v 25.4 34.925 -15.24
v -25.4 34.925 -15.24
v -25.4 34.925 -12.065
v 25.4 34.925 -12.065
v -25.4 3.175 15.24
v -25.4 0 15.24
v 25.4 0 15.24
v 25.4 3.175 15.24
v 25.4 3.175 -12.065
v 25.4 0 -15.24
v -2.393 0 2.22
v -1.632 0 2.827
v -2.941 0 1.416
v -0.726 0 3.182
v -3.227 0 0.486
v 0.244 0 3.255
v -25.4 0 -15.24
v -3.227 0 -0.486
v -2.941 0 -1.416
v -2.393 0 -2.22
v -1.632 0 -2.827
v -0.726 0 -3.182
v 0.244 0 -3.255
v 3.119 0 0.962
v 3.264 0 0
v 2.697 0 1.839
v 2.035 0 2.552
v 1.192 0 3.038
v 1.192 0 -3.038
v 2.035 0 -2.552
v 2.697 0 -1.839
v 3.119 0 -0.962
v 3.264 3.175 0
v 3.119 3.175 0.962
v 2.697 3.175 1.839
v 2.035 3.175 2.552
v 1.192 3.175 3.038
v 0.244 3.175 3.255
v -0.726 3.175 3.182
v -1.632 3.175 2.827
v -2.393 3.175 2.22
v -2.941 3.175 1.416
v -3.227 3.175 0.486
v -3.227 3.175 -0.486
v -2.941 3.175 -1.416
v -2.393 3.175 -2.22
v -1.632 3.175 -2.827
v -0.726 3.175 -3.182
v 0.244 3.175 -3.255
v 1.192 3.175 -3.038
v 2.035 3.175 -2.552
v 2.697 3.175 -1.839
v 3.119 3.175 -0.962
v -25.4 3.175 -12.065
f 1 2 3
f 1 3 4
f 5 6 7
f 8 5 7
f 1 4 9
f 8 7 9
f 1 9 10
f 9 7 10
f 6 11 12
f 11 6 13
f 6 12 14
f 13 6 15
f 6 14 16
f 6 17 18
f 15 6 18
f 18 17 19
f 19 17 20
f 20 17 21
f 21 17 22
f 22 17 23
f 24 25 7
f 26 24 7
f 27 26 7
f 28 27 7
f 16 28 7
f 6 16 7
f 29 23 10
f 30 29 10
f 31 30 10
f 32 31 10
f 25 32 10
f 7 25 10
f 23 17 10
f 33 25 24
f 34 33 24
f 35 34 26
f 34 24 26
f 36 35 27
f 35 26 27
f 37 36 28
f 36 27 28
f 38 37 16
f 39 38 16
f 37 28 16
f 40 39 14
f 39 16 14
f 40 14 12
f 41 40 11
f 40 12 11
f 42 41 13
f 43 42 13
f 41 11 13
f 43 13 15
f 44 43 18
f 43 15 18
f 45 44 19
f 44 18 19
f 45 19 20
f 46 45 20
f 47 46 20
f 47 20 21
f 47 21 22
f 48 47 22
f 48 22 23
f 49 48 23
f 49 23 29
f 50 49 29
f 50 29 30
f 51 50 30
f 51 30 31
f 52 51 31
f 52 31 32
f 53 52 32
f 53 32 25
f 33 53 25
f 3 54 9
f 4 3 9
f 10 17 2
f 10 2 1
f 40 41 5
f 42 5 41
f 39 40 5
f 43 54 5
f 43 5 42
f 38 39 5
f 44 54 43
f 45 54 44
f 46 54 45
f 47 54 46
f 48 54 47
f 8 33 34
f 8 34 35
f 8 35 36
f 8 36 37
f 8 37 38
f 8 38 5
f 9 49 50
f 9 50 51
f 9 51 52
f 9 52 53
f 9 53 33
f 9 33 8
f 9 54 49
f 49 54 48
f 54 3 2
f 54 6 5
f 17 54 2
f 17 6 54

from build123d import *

# Parameters (mm, degrees)
SKETCH1_W           = 50.8
SKETCH1_H           = 30.48
BOSS_EXTRUDE1_DEPTH = 3.175
SKETCH2_W           = 50.8
SKETCH2_H           = 3.175
BOSS_EXTRUDE2_DEPTH = 31.75
SKETCH3_R           = 3.2639
CUT_EXTRUDE1_DEPTH  = 50.8


with BuildPart() as part:
    # Sketch1 → Boss-Extrude1 (new body)
    with BuildSketch(Plane(origin=(0, 0, 0), x_dir=(1, 0, 0), z_dir=(0, 1, 0))):
        Rectangle(SKETCH1_W, SKETCH1_H)
    extrude(amount=BOSS_EXTRUDE1_DEPTH)

    # Sketch2 → Boss-Extrude2 (add)
    with BuildSketch(Plane(origin=(0, 3.175, 0), x_dir=(1, 0, 0), z_dir=(0, 1, 0))):
        with Locations((0, 13.6525)):
            Rectangle(SKETCH2_W, SKETCH2_H)
    extrude(amount=BOSS_EXTRUDE2_DEPTH)

    # Sketch3 → Cut-Extrude1 (cut)
    with BuildSketch(Plane.XZ):
        Circle(SKETCH3_R)
    extrude(amount=-CUT_EXTRUDE1_DEPTH, mode=Mode.SUBTRACT)


solid = part.part
